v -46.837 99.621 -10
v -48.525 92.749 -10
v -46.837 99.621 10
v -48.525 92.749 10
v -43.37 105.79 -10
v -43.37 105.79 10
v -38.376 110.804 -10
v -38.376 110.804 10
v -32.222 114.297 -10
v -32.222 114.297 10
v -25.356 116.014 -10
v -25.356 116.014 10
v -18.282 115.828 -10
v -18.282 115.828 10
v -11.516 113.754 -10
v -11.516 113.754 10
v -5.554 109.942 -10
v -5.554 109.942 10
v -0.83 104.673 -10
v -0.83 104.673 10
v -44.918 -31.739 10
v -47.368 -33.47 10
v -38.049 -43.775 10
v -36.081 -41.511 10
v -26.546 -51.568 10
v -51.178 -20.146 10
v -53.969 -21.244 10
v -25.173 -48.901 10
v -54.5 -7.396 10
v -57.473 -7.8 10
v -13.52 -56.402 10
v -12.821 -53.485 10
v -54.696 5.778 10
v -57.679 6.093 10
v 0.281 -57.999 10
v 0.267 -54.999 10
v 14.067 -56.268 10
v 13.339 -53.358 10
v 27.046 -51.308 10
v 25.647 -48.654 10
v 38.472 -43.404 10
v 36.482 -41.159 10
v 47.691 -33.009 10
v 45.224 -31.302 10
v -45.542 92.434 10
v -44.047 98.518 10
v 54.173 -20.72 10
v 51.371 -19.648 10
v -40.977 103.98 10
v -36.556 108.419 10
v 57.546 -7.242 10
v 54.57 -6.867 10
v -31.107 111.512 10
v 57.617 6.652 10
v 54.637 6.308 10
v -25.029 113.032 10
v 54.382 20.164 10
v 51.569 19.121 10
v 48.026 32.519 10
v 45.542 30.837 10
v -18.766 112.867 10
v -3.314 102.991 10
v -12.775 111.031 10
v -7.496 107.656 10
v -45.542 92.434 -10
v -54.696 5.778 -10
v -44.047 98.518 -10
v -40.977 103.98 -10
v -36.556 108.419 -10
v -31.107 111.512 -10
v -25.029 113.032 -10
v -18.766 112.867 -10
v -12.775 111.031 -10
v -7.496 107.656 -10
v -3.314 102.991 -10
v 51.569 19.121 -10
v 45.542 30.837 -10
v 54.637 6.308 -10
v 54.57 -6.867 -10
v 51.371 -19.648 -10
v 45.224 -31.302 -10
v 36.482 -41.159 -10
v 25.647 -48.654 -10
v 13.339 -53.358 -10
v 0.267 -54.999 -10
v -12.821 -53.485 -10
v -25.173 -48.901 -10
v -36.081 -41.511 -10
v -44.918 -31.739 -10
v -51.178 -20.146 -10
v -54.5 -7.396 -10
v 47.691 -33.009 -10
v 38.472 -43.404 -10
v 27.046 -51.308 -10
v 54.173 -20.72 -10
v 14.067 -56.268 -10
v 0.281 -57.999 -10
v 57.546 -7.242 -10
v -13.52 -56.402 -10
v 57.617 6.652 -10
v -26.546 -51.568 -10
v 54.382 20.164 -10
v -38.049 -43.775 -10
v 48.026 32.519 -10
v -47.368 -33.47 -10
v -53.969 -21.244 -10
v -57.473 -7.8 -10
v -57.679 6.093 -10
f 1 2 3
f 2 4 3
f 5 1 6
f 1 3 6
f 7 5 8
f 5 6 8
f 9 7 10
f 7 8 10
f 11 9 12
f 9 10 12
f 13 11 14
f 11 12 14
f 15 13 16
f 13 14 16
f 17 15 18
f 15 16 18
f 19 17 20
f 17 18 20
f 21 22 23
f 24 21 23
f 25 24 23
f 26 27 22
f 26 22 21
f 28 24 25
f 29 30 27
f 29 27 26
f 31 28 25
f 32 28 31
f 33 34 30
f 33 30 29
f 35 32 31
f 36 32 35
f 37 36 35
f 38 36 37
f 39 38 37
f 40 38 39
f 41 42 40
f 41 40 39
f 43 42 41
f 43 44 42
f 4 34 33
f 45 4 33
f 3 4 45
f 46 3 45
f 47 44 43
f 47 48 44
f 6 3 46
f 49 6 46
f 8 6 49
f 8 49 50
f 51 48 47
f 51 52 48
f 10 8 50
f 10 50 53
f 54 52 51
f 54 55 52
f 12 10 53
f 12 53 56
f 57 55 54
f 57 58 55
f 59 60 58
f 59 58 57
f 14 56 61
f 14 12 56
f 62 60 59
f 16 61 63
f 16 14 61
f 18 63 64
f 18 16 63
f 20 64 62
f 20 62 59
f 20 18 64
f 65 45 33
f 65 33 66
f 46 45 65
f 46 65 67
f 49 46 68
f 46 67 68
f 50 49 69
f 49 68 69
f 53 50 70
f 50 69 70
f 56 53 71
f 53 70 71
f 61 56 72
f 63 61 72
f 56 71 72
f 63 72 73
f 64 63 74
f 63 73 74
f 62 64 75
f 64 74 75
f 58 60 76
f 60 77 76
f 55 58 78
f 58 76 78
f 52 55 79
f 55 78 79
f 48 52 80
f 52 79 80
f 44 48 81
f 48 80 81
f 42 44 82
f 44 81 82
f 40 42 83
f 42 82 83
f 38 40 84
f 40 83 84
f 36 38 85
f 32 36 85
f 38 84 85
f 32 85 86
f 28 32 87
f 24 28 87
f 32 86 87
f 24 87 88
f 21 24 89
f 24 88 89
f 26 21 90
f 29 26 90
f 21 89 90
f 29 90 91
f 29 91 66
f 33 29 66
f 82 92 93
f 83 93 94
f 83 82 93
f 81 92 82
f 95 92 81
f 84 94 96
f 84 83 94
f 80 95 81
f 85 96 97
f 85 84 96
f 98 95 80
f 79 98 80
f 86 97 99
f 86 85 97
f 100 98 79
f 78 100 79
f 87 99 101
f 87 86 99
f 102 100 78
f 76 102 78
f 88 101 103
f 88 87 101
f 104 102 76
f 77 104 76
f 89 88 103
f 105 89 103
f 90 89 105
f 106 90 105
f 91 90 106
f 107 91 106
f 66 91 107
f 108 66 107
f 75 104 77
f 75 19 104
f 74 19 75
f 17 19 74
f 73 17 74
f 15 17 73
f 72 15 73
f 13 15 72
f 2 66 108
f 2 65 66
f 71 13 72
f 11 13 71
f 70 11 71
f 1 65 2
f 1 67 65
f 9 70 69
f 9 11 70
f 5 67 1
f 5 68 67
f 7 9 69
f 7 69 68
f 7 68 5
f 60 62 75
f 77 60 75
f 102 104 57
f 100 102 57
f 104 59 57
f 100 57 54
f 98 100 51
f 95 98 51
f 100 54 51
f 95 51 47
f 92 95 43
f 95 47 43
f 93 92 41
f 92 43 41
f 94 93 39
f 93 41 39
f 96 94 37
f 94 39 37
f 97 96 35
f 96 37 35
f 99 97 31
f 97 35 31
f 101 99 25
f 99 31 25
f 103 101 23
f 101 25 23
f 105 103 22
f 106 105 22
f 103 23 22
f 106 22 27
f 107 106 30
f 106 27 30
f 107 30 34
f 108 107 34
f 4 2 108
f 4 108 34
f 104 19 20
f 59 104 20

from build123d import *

# Parameters (mm, degrees)
SKETCH_3_W = 3
SKETCH_3_H = 20


with BuildPart() as part:
    # 扫描1: sweep along a path in 草图2
    with BuildLine(Plane.XY) as sweep_1_path:
        Line((-56.997873172, 6.020936707), (-47.843990191, 92.677197452))
        ThreePointArc((-47.843990191, 92.677197452), (-28.681020404, 114.724081616), (-1.397513338, 104.288816665))
        Line((-1.397513338, 104.288816665), (47.458859055, 32.135119764))
        ThreePointArc((47.458859055, 32.135119764), (13.900929349, -55.603717396), (-56.997873172, 6.020936707))
    # 草图3 → 扫描1 (sweep)
    with BuildSketch(Plane(origin=(0, 0, 0), x_dir=(1, 0, 0), z_dir=(0, 1, 0))):
        with Locations((-56.5, 0)):
            Rectangle(SKETCH_3_W, SKETCH_3_H)
    sweep(path=sweep_1_path.line)


solid = part.part
